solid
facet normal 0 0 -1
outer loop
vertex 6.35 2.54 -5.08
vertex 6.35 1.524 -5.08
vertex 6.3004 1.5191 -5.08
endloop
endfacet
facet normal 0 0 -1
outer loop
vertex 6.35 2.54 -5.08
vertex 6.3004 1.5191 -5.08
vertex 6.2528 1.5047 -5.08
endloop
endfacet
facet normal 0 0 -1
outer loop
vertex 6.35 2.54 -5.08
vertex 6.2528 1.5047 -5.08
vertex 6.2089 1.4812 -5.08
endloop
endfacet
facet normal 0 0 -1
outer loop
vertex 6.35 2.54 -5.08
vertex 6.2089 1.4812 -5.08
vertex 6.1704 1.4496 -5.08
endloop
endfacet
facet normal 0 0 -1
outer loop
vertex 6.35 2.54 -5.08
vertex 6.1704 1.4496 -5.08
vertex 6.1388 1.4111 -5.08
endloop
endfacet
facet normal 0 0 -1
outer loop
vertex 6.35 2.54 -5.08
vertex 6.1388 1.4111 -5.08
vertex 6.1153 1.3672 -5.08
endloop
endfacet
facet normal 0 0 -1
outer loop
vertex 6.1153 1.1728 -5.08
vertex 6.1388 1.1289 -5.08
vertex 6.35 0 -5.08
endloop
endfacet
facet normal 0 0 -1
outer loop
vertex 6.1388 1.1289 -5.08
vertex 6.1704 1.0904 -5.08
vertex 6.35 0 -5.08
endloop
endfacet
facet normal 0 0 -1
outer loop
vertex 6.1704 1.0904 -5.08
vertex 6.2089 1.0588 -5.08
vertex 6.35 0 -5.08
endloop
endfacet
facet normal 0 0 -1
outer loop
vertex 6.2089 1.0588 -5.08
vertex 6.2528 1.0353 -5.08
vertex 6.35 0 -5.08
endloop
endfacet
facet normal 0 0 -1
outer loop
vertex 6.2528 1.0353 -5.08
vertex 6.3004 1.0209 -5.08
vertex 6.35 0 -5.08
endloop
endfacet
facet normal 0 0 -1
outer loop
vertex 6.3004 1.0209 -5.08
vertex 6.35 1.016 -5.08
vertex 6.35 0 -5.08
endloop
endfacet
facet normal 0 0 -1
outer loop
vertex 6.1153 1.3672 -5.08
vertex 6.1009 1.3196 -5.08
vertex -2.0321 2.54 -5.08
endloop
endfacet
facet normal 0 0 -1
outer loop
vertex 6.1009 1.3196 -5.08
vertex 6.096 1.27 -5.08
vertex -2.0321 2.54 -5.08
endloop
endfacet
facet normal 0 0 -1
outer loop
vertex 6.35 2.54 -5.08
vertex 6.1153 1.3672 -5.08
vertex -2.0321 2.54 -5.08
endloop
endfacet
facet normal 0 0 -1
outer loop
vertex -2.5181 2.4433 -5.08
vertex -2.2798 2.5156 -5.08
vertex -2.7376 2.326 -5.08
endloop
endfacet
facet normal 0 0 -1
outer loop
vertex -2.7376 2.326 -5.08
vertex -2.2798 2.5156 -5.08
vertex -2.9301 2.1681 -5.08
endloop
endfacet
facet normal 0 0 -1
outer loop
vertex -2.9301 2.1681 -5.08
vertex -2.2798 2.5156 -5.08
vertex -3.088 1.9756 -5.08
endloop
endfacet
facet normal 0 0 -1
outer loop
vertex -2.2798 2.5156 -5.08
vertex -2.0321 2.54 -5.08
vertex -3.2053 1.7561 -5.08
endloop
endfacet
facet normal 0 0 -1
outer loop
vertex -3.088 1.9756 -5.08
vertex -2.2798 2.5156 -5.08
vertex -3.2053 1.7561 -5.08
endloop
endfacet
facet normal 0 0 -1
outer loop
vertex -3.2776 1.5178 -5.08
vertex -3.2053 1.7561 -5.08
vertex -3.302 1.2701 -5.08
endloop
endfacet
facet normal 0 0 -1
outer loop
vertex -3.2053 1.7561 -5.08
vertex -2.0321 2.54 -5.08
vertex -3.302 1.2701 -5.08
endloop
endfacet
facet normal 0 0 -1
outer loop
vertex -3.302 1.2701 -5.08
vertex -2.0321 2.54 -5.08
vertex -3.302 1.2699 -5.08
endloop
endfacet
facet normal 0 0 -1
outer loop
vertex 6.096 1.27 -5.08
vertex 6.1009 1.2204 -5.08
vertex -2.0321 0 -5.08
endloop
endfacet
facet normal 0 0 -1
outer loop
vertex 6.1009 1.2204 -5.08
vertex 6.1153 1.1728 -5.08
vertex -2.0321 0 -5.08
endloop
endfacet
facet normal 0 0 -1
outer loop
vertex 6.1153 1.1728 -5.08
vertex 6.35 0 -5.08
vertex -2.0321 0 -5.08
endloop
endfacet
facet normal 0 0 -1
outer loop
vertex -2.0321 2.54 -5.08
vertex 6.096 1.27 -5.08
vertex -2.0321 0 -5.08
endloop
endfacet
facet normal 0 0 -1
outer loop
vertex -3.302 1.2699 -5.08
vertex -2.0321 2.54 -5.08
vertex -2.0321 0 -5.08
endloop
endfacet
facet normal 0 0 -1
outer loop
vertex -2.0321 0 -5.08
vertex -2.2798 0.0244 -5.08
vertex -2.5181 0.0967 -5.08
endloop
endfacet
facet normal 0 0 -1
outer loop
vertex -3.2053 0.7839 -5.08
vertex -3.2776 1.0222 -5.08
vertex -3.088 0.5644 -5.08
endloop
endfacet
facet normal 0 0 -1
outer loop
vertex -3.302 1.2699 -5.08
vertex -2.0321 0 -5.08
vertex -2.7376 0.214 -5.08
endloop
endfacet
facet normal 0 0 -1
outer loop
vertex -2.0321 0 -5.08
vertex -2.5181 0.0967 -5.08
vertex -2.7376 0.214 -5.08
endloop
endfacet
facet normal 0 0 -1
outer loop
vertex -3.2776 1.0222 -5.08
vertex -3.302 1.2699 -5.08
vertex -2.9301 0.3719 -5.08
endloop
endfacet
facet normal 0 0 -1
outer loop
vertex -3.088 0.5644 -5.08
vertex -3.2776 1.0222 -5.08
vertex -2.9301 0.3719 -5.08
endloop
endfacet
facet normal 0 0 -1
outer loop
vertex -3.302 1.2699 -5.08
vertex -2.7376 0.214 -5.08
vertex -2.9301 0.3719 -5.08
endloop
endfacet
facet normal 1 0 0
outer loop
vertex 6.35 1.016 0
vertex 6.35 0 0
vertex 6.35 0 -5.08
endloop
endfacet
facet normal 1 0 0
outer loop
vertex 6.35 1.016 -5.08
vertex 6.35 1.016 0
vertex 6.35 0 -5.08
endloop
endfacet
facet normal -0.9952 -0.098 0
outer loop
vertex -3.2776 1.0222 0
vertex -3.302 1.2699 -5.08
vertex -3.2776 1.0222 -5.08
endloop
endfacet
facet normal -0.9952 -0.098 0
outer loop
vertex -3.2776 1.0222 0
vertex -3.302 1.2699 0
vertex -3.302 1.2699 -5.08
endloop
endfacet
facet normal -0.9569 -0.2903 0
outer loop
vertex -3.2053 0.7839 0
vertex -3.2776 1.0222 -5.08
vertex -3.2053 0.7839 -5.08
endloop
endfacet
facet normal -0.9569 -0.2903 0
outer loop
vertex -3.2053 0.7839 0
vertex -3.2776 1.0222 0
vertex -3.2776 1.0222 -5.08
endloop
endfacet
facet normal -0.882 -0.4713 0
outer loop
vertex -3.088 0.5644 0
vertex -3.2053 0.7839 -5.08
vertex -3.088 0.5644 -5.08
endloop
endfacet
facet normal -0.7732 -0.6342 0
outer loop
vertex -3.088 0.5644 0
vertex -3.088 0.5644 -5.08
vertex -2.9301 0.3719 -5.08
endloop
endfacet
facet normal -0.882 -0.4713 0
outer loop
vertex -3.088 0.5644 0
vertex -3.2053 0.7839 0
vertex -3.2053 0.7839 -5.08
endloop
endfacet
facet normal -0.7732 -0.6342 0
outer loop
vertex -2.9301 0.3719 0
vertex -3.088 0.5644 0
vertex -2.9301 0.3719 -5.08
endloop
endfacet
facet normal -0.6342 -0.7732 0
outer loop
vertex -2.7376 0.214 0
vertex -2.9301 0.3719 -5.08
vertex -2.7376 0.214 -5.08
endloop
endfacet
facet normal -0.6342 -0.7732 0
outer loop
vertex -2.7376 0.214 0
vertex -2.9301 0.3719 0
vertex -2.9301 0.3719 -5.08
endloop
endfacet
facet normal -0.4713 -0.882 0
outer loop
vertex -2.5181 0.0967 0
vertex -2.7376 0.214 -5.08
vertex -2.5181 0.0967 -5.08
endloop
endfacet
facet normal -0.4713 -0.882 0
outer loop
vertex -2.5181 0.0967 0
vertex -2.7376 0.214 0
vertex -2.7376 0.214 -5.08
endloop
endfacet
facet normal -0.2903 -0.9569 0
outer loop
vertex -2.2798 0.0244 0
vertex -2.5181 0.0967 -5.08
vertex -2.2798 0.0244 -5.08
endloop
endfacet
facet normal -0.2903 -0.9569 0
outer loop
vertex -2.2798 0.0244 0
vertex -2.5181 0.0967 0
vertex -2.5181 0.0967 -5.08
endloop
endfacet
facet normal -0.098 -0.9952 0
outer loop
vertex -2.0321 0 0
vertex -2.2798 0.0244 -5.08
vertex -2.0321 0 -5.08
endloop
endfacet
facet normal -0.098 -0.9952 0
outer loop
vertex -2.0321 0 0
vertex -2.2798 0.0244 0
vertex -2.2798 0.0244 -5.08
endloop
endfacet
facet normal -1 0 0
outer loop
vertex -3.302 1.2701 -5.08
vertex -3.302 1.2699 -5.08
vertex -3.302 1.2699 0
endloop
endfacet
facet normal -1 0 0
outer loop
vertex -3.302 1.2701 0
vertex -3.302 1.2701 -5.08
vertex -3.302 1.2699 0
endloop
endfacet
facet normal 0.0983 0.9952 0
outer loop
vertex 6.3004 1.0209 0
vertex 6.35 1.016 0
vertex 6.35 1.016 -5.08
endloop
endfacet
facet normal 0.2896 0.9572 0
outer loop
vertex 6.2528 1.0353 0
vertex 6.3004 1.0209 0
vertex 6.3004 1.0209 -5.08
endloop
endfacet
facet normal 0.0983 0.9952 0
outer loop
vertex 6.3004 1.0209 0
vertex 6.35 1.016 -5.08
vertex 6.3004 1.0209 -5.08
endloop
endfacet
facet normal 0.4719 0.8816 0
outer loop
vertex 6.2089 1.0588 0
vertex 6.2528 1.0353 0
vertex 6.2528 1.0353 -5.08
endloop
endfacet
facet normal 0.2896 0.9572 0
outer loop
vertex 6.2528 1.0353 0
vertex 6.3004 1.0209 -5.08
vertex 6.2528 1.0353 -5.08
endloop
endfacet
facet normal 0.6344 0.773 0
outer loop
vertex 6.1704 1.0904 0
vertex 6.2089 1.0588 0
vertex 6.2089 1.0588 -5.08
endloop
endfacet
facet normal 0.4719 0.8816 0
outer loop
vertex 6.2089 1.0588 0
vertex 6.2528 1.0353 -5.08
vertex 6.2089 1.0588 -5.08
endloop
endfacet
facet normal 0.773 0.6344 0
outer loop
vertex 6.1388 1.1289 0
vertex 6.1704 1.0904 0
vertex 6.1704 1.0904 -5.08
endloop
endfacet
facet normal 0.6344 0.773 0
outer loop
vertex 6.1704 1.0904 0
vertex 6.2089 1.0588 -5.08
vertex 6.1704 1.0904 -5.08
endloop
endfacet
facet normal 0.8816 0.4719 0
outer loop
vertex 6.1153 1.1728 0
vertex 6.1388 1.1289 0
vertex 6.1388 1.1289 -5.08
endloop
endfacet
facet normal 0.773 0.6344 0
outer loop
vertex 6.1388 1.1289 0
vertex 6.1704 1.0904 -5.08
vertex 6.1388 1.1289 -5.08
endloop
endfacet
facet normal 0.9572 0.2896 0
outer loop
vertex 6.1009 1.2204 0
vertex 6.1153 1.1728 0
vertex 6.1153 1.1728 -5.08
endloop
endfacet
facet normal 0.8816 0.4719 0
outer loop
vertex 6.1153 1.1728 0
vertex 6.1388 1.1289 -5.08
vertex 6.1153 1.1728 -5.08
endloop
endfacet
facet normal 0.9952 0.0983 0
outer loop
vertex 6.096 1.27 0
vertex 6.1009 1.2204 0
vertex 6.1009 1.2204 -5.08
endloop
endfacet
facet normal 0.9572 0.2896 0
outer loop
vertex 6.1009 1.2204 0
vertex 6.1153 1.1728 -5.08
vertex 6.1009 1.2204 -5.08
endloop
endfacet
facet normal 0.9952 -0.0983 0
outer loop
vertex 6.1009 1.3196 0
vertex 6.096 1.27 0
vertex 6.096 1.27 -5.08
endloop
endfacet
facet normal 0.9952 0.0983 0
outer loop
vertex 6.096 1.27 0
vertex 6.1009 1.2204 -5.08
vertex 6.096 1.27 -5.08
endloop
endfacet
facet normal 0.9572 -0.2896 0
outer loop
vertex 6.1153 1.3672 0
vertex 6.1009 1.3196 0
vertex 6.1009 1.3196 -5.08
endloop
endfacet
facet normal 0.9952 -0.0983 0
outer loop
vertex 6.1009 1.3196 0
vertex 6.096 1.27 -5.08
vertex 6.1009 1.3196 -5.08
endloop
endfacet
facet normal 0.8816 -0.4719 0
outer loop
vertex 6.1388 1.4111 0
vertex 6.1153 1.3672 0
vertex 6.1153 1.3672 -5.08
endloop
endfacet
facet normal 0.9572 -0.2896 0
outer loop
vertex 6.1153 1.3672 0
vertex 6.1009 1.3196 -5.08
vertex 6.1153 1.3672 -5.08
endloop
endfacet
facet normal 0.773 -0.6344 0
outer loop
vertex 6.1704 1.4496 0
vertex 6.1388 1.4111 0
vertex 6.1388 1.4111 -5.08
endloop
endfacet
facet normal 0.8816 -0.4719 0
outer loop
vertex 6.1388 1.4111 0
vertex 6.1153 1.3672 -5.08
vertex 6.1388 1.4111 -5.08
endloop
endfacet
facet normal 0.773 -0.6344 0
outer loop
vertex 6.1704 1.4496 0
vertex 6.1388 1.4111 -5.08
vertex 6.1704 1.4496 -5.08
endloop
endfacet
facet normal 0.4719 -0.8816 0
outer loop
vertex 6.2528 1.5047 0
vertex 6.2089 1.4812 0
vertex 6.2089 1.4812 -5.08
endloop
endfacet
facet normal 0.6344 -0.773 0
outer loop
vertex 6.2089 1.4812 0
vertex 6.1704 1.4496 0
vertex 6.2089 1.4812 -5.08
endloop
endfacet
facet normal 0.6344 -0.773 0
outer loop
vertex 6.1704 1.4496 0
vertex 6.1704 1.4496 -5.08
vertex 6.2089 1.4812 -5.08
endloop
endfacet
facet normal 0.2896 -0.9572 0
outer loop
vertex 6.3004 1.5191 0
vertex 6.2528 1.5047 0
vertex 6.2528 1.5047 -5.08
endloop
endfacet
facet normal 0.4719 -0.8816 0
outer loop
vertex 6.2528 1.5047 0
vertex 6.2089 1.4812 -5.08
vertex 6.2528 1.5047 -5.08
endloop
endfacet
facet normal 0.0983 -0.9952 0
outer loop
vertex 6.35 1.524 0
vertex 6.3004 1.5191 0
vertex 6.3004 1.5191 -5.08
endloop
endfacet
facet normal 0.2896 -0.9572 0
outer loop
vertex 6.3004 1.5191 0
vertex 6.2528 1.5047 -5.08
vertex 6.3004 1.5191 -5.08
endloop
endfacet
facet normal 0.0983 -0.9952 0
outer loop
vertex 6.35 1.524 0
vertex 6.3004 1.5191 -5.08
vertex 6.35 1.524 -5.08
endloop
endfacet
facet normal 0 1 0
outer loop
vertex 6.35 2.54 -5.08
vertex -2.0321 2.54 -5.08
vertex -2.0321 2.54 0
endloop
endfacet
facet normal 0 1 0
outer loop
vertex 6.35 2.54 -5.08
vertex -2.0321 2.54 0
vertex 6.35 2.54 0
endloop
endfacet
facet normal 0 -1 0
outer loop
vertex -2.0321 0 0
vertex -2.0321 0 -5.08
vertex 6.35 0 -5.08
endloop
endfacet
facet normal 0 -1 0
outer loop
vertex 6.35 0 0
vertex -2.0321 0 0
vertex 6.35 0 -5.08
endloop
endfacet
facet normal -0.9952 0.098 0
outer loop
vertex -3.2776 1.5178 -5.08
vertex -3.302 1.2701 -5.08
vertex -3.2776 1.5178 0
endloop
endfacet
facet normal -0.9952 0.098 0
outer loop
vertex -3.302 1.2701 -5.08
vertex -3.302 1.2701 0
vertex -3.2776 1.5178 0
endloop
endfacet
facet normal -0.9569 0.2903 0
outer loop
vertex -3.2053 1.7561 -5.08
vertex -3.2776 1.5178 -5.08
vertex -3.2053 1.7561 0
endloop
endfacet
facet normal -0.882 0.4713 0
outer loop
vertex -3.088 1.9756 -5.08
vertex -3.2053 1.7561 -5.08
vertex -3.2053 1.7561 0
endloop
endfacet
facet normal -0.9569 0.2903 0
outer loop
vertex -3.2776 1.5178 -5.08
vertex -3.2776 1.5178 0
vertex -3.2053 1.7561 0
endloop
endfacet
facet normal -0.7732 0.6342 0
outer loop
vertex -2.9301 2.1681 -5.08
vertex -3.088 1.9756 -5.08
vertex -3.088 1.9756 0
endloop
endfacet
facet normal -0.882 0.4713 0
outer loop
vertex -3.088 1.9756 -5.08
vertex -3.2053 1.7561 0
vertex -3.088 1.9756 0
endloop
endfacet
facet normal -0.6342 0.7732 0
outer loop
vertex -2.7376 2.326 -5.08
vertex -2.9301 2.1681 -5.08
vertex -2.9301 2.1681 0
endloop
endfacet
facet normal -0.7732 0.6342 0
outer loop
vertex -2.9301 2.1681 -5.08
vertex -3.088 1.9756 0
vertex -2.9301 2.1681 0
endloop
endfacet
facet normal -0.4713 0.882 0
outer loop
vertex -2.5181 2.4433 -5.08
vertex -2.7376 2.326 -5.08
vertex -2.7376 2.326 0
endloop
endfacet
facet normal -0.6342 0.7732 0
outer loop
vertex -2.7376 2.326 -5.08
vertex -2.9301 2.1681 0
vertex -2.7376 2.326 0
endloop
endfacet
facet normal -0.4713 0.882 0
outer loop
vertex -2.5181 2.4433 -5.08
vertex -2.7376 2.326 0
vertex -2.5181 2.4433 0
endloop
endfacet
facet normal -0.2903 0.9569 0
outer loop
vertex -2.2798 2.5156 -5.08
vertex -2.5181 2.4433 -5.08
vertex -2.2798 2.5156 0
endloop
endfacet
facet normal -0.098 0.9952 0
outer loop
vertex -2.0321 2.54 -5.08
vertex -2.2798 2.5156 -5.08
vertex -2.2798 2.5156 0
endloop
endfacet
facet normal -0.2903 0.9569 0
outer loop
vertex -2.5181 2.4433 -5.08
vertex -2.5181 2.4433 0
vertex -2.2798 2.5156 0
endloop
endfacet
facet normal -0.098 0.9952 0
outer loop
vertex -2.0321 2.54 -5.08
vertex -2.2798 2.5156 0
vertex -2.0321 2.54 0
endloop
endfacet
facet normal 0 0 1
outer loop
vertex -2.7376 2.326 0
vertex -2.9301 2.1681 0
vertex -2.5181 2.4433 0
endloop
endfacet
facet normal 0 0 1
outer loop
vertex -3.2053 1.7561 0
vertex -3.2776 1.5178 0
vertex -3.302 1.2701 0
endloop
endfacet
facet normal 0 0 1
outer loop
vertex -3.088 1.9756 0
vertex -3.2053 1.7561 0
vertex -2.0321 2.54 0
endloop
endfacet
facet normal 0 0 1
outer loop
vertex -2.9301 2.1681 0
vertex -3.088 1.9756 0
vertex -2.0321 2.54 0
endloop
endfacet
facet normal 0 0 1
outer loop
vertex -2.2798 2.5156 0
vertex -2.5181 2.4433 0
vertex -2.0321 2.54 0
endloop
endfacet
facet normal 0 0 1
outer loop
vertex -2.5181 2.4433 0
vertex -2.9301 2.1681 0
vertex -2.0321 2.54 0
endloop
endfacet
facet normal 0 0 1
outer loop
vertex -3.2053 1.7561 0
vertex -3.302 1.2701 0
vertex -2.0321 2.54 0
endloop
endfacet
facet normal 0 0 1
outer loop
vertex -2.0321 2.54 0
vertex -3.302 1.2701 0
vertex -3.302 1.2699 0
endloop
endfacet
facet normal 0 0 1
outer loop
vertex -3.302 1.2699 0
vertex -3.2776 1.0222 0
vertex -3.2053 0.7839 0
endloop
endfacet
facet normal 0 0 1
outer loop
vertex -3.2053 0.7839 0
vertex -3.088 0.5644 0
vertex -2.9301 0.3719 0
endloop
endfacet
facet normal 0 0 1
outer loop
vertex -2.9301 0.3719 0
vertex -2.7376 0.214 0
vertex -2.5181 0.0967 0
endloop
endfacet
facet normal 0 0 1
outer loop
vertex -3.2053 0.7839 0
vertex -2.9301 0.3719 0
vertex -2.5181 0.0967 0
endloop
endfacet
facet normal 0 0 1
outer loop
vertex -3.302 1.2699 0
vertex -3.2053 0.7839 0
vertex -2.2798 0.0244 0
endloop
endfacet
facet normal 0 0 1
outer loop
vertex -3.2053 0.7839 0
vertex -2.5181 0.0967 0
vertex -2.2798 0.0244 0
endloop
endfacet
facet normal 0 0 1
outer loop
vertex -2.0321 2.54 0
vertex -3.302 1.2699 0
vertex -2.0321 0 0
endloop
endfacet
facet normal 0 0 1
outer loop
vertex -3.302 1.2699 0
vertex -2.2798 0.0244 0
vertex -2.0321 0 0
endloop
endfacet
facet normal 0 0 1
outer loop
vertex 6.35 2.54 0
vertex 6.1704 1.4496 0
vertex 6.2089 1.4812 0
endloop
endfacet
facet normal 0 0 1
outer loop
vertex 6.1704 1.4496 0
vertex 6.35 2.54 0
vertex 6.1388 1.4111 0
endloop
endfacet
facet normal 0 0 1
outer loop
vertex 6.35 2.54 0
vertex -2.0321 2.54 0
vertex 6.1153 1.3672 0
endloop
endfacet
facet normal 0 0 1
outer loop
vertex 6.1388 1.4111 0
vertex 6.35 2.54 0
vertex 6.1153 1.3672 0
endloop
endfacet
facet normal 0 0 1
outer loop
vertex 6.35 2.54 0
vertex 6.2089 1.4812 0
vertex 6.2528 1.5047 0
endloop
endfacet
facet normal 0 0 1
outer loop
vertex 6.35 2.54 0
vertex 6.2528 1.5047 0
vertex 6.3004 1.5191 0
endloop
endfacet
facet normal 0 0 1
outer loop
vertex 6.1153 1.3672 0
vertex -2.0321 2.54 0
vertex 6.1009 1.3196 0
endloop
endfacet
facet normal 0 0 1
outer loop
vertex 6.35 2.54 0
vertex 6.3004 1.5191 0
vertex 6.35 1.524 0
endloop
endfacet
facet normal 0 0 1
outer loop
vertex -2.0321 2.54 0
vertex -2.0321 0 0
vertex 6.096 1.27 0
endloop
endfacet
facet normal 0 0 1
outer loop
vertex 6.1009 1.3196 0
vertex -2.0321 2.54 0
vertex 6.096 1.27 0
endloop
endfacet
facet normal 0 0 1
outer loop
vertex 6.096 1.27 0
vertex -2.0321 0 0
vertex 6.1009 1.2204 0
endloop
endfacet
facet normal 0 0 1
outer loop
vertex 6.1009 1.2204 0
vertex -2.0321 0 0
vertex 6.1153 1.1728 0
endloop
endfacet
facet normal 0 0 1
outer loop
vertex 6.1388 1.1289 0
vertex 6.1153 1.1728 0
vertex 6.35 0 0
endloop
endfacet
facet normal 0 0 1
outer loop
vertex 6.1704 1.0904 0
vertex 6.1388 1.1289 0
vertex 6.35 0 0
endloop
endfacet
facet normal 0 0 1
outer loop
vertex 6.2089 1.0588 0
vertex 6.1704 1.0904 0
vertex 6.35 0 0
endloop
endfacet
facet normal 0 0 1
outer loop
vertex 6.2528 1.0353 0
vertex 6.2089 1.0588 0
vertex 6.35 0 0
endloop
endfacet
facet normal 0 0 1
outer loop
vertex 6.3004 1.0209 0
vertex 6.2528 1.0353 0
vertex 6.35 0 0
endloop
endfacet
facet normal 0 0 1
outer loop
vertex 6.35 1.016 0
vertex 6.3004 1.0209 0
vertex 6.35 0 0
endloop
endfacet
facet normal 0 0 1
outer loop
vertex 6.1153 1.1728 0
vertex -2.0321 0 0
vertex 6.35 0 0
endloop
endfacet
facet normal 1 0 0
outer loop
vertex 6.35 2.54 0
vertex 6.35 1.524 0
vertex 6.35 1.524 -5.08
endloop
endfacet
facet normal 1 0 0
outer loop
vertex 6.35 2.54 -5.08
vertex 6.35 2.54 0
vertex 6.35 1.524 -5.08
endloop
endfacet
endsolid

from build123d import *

# Parameters (mm, degrees)
BOSS_EXTRUDE1_DEPTH              = 2.54
FILLET1_R                        = 1.27
F_97_0_0059_DIAMETER_HOLE2_D     = 0.508
F_97_0_0059_DIAMETER_HOLE2_DEPTH = 25.4
F_97_0_0059_DIAMETER_HOLE2_TIP   = 0.152618597


with BuildPart() as part:
    # Sketch1 → Boss-Extrude1 (new body)
    with BuildSketch(Plane(origin=(0, 0, 0), x_dir=(1, 0, 0), z_dir=(0, 1, 0))):
        Polygon((0, 0), (6.35, 0), (6.35, 5.08), (-3.302, 5.08), (-3.302, 0), align=None)
    extrude(amount=BOSS_EXTRUDE1_DEPTH)

    # Fillet1
    fillet1_edges = [part.edges().sort_by_distance(p)[0] for p in [
        (-3.302, 0, -2.54),
        (-3.302, 2.54, -2.54),
    ]]
    fillet(fillet1_edges, radius=FILLET1_R - 0.0001)  # a hair under: the kernel refuses the full size

    # #97 (0.0059) Diameter Hole2
    with Locations(Plane.XY):
        with Locations((6.35, 1.27)):
            Hole(F_97_0_0059_DIAMETER_HOLE2_D / 2, depth=F_97_0_0059_DIAMETER_HOLE2_DEPTH)
            with Locations((0, 0, -(F_97_0_0059_DIAMETER_HOLE2_DEPTH + F_97_0_0059_DIAMETER_HOLE2_TIP / 2))):  # 118° drill point
                Cone(0, F_97_0_0059_DIAMETER_HOLE2_D / 2, F_97_0_0059_DIAMETER_HOLE2_TIP, mode=Mode.SUBTRACT)


solid = part.part
